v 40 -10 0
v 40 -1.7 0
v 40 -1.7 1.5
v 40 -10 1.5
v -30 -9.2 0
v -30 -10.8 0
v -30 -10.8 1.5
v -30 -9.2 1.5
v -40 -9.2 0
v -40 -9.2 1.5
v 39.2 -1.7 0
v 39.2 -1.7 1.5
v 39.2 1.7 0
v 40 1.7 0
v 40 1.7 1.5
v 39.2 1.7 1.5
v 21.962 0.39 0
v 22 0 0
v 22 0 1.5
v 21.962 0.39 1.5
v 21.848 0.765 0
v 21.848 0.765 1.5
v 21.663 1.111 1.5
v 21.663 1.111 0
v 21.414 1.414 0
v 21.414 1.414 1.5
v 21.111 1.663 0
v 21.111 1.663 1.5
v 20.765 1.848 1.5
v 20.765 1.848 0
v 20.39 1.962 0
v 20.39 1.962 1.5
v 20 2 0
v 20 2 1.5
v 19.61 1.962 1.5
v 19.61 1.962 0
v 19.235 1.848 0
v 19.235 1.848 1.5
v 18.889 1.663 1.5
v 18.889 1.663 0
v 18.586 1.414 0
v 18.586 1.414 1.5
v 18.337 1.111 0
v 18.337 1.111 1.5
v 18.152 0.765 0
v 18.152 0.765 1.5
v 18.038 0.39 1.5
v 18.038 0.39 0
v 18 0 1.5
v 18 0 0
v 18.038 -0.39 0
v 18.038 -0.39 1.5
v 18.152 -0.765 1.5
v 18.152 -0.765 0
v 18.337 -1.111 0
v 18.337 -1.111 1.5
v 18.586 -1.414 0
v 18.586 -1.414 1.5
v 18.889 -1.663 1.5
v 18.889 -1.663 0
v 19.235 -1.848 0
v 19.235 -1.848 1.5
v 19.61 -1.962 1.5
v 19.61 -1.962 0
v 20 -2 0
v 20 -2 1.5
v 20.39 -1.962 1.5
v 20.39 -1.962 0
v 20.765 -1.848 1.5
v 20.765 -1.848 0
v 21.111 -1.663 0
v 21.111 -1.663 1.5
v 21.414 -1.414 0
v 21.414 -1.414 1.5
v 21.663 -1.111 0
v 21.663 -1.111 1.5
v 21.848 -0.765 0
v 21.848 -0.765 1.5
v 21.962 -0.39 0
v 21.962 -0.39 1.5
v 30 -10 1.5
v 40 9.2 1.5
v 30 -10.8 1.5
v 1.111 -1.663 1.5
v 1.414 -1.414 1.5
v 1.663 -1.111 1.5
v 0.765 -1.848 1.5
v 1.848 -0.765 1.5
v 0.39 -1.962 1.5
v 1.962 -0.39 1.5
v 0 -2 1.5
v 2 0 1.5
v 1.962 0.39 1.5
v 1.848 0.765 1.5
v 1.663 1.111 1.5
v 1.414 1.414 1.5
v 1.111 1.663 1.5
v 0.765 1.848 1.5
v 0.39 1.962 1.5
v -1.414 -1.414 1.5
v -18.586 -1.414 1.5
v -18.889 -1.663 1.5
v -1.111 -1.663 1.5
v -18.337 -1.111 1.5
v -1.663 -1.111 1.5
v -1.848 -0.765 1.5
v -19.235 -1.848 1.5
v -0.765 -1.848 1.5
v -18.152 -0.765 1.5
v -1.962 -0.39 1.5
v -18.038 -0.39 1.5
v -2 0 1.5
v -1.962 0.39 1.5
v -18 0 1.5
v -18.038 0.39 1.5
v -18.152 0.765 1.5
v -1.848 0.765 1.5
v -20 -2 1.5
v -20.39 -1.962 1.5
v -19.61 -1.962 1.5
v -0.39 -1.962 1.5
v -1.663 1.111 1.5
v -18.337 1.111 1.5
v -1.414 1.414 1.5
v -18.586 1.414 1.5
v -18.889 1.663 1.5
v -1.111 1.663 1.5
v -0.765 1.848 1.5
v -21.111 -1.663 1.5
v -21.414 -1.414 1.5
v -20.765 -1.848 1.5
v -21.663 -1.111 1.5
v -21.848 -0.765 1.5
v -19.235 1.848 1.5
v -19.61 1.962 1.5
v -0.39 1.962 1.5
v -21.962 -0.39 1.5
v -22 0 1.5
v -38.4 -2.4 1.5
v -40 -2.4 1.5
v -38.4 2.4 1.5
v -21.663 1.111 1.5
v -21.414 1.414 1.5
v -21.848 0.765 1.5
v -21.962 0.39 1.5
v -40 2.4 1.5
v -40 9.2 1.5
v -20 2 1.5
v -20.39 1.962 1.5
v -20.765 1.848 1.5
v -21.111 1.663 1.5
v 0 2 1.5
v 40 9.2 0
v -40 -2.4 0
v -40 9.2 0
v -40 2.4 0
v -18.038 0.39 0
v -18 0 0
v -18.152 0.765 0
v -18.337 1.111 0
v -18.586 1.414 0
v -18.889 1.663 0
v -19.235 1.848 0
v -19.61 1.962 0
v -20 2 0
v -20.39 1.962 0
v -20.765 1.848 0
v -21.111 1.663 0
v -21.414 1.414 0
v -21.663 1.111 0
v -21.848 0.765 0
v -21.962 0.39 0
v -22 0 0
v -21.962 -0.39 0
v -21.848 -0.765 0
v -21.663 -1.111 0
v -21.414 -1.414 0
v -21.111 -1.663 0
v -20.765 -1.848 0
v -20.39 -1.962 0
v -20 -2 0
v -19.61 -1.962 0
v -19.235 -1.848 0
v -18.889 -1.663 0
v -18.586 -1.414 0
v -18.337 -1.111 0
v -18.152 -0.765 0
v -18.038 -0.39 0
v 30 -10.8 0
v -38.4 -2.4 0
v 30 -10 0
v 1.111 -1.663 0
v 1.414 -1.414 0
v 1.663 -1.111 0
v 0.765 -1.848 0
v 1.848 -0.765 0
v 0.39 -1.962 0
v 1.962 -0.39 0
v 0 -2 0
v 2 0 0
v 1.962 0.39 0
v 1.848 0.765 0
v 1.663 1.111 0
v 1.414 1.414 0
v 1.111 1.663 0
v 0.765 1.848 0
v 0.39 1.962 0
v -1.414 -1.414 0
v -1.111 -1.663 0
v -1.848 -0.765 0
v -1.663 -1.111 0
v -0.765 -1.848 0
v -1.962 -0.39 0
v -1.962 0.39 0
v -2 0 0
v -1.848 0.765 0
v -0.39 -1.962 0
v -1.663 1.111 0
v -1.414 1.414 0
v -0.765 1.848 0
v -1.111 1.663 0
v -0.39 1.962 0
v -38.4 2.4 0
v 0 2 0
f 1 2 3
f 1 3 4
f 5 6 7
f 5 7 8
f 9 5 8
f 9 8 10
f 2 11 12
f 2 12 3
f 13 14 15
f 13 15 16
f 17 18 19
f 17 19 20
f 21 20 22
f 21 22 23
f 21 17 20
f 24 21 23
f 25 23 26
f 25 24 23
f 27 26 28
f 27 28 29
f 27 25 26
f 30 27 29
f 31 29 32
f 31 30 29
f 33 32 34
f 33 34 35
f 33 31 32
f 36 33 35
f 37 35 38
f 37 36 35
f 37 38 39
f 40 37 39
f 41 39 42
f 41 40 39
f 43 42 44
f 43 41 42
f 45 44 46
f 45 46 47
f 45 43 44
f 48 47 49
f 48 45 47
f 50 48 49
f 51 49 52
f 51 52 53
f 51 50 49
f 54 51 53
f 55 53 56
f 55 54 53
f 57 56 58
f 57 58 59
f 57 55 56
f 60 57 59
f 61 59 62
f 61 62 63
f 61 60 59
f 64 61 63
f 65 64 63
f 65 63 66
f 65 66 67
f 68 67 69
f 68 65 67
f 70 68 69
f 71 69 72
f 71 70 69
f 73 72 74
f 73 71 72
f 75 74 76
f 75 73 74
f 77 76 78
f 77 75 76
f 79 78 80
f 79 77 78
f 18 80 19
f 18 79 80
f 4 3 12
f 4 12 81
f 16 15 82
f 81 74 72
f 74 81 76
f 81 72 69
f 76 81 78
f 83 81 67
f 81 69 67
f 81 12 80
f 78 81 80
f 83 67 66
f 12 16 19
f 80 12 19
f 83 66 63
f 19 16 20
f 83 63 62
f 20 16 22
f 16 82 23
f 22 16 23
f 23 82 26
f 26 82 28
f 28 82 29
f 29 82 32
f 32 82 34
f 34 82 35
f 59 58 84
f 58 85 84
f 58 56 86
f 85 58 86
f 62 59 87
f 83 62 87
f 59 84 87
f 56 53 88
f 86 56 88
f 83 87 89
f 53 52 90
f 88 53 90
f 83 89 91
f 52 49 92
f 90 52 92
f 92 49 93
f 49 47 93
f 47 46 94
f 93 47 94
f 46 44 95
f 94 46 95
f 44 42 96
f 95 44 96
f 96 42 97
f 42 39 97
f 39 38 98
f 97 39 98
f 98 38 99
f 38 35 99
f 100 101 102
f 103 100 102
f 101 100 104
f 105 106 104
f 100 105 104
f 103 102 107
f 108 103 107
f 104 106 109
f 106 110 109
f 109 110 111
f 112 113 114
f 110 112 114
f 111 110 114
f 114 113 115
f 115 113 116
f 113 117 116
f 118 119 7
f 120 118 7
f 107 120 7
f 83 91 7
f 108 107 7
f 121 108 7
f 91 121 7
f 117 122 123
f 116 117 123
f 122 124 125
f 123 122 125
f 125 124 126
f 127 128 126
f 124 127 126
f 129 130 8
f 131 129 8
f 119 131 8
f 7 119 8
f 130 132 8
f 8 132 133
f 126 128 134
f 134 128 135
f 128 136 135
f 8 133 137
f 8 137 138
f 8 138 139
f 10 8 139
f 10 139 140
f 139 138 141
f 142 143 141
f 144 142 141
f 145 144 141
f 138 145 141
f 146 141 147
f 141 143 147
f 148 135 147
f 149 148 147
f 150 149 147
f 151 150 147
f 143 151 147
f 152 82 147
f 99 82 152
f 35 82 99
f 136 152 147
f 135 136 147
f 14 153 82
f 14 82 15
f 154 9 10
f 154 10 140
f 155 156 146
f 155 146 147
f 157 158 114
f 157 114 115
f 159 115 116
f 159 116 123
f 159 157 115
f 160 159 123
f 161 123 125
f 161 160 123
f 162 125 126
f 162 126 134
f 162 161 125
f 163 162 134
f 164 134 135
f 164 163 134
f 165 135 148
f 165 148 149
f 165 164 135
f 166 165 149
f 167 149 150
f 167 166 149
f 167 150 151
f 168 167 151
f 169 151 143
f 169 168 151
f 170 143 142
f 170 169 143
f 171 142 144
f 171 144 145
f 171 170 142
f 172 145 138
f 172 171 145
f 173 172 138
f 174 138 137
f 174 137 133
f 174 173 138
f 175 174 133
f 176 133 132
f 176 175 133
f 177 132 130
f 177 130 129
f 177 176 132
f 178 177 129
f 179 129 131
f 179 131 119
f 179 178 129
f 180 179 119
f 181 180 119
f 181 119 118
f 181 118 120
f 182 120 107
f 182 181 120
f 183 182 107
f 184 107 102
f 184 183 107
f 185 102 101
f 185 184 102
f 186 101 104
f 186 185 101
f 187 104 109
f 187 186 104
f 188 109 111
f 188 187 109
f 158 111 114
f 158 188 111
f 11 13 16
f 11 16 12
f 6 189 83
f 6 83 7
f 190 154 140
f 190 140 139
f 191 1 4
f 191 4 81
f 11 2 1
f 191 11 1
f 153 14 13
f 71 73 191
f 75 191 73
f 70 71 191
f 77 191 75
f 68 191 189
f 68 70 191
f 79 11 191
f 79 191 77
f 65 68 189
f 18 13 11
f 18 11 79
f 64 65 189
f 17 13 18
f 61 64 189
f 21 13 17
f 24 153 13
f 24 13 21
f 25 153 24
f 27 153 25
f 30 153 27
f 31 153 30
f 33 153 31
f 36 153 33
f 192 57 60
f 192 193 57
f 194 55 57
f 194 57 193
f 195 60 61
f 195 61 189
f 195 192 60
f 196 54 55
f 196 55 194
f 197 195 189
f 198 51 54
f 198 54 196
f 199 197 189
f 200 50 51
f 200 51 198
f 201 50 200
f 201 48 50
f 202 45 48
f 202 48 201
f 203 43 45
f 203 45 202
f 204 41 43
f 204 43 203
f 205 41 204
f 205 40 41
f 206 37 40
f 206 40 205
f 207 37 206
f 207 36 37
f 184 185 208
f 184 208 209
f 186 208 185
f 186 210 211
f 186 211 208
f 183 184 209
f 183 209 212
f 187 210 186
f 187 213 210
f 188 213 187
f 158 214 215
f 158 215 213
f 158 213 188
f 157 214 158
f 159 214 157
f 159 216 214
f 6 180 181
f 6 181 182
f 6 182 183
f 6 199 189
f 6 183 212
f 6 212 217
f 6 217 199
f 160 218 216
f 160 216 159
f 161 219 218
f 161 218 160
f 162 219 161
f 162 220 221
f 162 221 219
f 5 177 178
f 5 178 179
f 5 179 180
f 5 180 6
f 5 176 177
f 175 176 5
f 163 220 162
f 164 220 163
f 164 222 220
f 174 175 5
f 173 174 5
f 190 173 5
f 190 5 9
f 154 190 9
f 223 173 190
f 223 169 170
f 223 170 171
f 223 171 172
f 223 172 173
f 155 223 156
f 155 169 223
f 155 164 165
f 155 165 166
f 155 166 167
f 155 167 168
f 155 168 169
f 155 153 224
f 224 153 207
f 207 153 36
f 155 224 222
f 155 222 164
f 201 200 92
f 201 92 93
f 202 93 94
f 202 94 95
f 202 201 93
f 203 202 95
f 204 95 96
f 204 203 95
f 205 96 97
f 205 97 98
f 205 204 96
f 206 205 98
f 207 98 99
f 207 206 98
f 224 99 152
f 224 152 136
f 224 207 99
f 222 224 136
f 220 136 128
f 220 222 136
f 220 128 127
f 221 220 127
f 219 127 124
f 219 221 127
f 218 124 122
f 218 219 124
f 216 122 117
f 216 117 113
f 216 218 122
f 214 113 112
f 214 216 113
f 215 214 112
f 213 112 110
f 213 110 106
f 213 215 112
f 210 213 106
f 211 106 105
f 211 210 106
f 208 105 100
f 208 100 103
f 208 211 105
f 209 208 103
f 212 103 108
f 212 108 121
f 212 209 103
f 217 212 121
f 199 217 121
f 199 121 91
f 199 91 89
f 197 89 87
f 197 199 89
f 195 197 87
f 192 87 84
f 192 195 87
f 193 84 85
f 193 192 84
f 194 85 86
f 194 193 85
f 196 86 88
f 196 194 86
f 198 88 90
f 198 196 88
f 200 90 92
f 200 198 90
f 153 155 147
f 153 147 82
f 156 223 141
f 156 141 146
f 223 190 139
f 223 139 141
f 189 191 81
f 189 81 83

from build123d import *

# Parameters (mm, degrees)
CROQUIS1_R              = 2
SALIENTE_EXTRUIR1_DEPTH = 1.5


with BuildPart() as part:
    # Croquis1 → Saliente-Extruir1 (new body)
    with BuildSketch(Plane.XY):
        Polygon((-40, 9.2), (40, 9.2), (40, 1.7), (39.2, 1.7), (39.2, -1.7), (40, -1.7), (40, -10), (30, -10), (30, -10.8), (-30, -10.8), (-30, -9.2), (-40, -9.2), (-40, -2.4), (-38.4, -2.4), (-38.4, 2.4), (-40, 2.4), align=None)
        with Locations((20, 0)):
            Circle(CROQUIS1_R, mode=Mode.SUBTRACT)
        Circle(CROQUIS1_R, mode=Mode.SUBTRACT)
        with Locations((-20, 0)):
            Circle(CROQUIS1_R, mode=Mode.SUBTRACT)
    extrude(amount=SALIENTE_EXTRUIR1_DEPTH)


solid = part.part
